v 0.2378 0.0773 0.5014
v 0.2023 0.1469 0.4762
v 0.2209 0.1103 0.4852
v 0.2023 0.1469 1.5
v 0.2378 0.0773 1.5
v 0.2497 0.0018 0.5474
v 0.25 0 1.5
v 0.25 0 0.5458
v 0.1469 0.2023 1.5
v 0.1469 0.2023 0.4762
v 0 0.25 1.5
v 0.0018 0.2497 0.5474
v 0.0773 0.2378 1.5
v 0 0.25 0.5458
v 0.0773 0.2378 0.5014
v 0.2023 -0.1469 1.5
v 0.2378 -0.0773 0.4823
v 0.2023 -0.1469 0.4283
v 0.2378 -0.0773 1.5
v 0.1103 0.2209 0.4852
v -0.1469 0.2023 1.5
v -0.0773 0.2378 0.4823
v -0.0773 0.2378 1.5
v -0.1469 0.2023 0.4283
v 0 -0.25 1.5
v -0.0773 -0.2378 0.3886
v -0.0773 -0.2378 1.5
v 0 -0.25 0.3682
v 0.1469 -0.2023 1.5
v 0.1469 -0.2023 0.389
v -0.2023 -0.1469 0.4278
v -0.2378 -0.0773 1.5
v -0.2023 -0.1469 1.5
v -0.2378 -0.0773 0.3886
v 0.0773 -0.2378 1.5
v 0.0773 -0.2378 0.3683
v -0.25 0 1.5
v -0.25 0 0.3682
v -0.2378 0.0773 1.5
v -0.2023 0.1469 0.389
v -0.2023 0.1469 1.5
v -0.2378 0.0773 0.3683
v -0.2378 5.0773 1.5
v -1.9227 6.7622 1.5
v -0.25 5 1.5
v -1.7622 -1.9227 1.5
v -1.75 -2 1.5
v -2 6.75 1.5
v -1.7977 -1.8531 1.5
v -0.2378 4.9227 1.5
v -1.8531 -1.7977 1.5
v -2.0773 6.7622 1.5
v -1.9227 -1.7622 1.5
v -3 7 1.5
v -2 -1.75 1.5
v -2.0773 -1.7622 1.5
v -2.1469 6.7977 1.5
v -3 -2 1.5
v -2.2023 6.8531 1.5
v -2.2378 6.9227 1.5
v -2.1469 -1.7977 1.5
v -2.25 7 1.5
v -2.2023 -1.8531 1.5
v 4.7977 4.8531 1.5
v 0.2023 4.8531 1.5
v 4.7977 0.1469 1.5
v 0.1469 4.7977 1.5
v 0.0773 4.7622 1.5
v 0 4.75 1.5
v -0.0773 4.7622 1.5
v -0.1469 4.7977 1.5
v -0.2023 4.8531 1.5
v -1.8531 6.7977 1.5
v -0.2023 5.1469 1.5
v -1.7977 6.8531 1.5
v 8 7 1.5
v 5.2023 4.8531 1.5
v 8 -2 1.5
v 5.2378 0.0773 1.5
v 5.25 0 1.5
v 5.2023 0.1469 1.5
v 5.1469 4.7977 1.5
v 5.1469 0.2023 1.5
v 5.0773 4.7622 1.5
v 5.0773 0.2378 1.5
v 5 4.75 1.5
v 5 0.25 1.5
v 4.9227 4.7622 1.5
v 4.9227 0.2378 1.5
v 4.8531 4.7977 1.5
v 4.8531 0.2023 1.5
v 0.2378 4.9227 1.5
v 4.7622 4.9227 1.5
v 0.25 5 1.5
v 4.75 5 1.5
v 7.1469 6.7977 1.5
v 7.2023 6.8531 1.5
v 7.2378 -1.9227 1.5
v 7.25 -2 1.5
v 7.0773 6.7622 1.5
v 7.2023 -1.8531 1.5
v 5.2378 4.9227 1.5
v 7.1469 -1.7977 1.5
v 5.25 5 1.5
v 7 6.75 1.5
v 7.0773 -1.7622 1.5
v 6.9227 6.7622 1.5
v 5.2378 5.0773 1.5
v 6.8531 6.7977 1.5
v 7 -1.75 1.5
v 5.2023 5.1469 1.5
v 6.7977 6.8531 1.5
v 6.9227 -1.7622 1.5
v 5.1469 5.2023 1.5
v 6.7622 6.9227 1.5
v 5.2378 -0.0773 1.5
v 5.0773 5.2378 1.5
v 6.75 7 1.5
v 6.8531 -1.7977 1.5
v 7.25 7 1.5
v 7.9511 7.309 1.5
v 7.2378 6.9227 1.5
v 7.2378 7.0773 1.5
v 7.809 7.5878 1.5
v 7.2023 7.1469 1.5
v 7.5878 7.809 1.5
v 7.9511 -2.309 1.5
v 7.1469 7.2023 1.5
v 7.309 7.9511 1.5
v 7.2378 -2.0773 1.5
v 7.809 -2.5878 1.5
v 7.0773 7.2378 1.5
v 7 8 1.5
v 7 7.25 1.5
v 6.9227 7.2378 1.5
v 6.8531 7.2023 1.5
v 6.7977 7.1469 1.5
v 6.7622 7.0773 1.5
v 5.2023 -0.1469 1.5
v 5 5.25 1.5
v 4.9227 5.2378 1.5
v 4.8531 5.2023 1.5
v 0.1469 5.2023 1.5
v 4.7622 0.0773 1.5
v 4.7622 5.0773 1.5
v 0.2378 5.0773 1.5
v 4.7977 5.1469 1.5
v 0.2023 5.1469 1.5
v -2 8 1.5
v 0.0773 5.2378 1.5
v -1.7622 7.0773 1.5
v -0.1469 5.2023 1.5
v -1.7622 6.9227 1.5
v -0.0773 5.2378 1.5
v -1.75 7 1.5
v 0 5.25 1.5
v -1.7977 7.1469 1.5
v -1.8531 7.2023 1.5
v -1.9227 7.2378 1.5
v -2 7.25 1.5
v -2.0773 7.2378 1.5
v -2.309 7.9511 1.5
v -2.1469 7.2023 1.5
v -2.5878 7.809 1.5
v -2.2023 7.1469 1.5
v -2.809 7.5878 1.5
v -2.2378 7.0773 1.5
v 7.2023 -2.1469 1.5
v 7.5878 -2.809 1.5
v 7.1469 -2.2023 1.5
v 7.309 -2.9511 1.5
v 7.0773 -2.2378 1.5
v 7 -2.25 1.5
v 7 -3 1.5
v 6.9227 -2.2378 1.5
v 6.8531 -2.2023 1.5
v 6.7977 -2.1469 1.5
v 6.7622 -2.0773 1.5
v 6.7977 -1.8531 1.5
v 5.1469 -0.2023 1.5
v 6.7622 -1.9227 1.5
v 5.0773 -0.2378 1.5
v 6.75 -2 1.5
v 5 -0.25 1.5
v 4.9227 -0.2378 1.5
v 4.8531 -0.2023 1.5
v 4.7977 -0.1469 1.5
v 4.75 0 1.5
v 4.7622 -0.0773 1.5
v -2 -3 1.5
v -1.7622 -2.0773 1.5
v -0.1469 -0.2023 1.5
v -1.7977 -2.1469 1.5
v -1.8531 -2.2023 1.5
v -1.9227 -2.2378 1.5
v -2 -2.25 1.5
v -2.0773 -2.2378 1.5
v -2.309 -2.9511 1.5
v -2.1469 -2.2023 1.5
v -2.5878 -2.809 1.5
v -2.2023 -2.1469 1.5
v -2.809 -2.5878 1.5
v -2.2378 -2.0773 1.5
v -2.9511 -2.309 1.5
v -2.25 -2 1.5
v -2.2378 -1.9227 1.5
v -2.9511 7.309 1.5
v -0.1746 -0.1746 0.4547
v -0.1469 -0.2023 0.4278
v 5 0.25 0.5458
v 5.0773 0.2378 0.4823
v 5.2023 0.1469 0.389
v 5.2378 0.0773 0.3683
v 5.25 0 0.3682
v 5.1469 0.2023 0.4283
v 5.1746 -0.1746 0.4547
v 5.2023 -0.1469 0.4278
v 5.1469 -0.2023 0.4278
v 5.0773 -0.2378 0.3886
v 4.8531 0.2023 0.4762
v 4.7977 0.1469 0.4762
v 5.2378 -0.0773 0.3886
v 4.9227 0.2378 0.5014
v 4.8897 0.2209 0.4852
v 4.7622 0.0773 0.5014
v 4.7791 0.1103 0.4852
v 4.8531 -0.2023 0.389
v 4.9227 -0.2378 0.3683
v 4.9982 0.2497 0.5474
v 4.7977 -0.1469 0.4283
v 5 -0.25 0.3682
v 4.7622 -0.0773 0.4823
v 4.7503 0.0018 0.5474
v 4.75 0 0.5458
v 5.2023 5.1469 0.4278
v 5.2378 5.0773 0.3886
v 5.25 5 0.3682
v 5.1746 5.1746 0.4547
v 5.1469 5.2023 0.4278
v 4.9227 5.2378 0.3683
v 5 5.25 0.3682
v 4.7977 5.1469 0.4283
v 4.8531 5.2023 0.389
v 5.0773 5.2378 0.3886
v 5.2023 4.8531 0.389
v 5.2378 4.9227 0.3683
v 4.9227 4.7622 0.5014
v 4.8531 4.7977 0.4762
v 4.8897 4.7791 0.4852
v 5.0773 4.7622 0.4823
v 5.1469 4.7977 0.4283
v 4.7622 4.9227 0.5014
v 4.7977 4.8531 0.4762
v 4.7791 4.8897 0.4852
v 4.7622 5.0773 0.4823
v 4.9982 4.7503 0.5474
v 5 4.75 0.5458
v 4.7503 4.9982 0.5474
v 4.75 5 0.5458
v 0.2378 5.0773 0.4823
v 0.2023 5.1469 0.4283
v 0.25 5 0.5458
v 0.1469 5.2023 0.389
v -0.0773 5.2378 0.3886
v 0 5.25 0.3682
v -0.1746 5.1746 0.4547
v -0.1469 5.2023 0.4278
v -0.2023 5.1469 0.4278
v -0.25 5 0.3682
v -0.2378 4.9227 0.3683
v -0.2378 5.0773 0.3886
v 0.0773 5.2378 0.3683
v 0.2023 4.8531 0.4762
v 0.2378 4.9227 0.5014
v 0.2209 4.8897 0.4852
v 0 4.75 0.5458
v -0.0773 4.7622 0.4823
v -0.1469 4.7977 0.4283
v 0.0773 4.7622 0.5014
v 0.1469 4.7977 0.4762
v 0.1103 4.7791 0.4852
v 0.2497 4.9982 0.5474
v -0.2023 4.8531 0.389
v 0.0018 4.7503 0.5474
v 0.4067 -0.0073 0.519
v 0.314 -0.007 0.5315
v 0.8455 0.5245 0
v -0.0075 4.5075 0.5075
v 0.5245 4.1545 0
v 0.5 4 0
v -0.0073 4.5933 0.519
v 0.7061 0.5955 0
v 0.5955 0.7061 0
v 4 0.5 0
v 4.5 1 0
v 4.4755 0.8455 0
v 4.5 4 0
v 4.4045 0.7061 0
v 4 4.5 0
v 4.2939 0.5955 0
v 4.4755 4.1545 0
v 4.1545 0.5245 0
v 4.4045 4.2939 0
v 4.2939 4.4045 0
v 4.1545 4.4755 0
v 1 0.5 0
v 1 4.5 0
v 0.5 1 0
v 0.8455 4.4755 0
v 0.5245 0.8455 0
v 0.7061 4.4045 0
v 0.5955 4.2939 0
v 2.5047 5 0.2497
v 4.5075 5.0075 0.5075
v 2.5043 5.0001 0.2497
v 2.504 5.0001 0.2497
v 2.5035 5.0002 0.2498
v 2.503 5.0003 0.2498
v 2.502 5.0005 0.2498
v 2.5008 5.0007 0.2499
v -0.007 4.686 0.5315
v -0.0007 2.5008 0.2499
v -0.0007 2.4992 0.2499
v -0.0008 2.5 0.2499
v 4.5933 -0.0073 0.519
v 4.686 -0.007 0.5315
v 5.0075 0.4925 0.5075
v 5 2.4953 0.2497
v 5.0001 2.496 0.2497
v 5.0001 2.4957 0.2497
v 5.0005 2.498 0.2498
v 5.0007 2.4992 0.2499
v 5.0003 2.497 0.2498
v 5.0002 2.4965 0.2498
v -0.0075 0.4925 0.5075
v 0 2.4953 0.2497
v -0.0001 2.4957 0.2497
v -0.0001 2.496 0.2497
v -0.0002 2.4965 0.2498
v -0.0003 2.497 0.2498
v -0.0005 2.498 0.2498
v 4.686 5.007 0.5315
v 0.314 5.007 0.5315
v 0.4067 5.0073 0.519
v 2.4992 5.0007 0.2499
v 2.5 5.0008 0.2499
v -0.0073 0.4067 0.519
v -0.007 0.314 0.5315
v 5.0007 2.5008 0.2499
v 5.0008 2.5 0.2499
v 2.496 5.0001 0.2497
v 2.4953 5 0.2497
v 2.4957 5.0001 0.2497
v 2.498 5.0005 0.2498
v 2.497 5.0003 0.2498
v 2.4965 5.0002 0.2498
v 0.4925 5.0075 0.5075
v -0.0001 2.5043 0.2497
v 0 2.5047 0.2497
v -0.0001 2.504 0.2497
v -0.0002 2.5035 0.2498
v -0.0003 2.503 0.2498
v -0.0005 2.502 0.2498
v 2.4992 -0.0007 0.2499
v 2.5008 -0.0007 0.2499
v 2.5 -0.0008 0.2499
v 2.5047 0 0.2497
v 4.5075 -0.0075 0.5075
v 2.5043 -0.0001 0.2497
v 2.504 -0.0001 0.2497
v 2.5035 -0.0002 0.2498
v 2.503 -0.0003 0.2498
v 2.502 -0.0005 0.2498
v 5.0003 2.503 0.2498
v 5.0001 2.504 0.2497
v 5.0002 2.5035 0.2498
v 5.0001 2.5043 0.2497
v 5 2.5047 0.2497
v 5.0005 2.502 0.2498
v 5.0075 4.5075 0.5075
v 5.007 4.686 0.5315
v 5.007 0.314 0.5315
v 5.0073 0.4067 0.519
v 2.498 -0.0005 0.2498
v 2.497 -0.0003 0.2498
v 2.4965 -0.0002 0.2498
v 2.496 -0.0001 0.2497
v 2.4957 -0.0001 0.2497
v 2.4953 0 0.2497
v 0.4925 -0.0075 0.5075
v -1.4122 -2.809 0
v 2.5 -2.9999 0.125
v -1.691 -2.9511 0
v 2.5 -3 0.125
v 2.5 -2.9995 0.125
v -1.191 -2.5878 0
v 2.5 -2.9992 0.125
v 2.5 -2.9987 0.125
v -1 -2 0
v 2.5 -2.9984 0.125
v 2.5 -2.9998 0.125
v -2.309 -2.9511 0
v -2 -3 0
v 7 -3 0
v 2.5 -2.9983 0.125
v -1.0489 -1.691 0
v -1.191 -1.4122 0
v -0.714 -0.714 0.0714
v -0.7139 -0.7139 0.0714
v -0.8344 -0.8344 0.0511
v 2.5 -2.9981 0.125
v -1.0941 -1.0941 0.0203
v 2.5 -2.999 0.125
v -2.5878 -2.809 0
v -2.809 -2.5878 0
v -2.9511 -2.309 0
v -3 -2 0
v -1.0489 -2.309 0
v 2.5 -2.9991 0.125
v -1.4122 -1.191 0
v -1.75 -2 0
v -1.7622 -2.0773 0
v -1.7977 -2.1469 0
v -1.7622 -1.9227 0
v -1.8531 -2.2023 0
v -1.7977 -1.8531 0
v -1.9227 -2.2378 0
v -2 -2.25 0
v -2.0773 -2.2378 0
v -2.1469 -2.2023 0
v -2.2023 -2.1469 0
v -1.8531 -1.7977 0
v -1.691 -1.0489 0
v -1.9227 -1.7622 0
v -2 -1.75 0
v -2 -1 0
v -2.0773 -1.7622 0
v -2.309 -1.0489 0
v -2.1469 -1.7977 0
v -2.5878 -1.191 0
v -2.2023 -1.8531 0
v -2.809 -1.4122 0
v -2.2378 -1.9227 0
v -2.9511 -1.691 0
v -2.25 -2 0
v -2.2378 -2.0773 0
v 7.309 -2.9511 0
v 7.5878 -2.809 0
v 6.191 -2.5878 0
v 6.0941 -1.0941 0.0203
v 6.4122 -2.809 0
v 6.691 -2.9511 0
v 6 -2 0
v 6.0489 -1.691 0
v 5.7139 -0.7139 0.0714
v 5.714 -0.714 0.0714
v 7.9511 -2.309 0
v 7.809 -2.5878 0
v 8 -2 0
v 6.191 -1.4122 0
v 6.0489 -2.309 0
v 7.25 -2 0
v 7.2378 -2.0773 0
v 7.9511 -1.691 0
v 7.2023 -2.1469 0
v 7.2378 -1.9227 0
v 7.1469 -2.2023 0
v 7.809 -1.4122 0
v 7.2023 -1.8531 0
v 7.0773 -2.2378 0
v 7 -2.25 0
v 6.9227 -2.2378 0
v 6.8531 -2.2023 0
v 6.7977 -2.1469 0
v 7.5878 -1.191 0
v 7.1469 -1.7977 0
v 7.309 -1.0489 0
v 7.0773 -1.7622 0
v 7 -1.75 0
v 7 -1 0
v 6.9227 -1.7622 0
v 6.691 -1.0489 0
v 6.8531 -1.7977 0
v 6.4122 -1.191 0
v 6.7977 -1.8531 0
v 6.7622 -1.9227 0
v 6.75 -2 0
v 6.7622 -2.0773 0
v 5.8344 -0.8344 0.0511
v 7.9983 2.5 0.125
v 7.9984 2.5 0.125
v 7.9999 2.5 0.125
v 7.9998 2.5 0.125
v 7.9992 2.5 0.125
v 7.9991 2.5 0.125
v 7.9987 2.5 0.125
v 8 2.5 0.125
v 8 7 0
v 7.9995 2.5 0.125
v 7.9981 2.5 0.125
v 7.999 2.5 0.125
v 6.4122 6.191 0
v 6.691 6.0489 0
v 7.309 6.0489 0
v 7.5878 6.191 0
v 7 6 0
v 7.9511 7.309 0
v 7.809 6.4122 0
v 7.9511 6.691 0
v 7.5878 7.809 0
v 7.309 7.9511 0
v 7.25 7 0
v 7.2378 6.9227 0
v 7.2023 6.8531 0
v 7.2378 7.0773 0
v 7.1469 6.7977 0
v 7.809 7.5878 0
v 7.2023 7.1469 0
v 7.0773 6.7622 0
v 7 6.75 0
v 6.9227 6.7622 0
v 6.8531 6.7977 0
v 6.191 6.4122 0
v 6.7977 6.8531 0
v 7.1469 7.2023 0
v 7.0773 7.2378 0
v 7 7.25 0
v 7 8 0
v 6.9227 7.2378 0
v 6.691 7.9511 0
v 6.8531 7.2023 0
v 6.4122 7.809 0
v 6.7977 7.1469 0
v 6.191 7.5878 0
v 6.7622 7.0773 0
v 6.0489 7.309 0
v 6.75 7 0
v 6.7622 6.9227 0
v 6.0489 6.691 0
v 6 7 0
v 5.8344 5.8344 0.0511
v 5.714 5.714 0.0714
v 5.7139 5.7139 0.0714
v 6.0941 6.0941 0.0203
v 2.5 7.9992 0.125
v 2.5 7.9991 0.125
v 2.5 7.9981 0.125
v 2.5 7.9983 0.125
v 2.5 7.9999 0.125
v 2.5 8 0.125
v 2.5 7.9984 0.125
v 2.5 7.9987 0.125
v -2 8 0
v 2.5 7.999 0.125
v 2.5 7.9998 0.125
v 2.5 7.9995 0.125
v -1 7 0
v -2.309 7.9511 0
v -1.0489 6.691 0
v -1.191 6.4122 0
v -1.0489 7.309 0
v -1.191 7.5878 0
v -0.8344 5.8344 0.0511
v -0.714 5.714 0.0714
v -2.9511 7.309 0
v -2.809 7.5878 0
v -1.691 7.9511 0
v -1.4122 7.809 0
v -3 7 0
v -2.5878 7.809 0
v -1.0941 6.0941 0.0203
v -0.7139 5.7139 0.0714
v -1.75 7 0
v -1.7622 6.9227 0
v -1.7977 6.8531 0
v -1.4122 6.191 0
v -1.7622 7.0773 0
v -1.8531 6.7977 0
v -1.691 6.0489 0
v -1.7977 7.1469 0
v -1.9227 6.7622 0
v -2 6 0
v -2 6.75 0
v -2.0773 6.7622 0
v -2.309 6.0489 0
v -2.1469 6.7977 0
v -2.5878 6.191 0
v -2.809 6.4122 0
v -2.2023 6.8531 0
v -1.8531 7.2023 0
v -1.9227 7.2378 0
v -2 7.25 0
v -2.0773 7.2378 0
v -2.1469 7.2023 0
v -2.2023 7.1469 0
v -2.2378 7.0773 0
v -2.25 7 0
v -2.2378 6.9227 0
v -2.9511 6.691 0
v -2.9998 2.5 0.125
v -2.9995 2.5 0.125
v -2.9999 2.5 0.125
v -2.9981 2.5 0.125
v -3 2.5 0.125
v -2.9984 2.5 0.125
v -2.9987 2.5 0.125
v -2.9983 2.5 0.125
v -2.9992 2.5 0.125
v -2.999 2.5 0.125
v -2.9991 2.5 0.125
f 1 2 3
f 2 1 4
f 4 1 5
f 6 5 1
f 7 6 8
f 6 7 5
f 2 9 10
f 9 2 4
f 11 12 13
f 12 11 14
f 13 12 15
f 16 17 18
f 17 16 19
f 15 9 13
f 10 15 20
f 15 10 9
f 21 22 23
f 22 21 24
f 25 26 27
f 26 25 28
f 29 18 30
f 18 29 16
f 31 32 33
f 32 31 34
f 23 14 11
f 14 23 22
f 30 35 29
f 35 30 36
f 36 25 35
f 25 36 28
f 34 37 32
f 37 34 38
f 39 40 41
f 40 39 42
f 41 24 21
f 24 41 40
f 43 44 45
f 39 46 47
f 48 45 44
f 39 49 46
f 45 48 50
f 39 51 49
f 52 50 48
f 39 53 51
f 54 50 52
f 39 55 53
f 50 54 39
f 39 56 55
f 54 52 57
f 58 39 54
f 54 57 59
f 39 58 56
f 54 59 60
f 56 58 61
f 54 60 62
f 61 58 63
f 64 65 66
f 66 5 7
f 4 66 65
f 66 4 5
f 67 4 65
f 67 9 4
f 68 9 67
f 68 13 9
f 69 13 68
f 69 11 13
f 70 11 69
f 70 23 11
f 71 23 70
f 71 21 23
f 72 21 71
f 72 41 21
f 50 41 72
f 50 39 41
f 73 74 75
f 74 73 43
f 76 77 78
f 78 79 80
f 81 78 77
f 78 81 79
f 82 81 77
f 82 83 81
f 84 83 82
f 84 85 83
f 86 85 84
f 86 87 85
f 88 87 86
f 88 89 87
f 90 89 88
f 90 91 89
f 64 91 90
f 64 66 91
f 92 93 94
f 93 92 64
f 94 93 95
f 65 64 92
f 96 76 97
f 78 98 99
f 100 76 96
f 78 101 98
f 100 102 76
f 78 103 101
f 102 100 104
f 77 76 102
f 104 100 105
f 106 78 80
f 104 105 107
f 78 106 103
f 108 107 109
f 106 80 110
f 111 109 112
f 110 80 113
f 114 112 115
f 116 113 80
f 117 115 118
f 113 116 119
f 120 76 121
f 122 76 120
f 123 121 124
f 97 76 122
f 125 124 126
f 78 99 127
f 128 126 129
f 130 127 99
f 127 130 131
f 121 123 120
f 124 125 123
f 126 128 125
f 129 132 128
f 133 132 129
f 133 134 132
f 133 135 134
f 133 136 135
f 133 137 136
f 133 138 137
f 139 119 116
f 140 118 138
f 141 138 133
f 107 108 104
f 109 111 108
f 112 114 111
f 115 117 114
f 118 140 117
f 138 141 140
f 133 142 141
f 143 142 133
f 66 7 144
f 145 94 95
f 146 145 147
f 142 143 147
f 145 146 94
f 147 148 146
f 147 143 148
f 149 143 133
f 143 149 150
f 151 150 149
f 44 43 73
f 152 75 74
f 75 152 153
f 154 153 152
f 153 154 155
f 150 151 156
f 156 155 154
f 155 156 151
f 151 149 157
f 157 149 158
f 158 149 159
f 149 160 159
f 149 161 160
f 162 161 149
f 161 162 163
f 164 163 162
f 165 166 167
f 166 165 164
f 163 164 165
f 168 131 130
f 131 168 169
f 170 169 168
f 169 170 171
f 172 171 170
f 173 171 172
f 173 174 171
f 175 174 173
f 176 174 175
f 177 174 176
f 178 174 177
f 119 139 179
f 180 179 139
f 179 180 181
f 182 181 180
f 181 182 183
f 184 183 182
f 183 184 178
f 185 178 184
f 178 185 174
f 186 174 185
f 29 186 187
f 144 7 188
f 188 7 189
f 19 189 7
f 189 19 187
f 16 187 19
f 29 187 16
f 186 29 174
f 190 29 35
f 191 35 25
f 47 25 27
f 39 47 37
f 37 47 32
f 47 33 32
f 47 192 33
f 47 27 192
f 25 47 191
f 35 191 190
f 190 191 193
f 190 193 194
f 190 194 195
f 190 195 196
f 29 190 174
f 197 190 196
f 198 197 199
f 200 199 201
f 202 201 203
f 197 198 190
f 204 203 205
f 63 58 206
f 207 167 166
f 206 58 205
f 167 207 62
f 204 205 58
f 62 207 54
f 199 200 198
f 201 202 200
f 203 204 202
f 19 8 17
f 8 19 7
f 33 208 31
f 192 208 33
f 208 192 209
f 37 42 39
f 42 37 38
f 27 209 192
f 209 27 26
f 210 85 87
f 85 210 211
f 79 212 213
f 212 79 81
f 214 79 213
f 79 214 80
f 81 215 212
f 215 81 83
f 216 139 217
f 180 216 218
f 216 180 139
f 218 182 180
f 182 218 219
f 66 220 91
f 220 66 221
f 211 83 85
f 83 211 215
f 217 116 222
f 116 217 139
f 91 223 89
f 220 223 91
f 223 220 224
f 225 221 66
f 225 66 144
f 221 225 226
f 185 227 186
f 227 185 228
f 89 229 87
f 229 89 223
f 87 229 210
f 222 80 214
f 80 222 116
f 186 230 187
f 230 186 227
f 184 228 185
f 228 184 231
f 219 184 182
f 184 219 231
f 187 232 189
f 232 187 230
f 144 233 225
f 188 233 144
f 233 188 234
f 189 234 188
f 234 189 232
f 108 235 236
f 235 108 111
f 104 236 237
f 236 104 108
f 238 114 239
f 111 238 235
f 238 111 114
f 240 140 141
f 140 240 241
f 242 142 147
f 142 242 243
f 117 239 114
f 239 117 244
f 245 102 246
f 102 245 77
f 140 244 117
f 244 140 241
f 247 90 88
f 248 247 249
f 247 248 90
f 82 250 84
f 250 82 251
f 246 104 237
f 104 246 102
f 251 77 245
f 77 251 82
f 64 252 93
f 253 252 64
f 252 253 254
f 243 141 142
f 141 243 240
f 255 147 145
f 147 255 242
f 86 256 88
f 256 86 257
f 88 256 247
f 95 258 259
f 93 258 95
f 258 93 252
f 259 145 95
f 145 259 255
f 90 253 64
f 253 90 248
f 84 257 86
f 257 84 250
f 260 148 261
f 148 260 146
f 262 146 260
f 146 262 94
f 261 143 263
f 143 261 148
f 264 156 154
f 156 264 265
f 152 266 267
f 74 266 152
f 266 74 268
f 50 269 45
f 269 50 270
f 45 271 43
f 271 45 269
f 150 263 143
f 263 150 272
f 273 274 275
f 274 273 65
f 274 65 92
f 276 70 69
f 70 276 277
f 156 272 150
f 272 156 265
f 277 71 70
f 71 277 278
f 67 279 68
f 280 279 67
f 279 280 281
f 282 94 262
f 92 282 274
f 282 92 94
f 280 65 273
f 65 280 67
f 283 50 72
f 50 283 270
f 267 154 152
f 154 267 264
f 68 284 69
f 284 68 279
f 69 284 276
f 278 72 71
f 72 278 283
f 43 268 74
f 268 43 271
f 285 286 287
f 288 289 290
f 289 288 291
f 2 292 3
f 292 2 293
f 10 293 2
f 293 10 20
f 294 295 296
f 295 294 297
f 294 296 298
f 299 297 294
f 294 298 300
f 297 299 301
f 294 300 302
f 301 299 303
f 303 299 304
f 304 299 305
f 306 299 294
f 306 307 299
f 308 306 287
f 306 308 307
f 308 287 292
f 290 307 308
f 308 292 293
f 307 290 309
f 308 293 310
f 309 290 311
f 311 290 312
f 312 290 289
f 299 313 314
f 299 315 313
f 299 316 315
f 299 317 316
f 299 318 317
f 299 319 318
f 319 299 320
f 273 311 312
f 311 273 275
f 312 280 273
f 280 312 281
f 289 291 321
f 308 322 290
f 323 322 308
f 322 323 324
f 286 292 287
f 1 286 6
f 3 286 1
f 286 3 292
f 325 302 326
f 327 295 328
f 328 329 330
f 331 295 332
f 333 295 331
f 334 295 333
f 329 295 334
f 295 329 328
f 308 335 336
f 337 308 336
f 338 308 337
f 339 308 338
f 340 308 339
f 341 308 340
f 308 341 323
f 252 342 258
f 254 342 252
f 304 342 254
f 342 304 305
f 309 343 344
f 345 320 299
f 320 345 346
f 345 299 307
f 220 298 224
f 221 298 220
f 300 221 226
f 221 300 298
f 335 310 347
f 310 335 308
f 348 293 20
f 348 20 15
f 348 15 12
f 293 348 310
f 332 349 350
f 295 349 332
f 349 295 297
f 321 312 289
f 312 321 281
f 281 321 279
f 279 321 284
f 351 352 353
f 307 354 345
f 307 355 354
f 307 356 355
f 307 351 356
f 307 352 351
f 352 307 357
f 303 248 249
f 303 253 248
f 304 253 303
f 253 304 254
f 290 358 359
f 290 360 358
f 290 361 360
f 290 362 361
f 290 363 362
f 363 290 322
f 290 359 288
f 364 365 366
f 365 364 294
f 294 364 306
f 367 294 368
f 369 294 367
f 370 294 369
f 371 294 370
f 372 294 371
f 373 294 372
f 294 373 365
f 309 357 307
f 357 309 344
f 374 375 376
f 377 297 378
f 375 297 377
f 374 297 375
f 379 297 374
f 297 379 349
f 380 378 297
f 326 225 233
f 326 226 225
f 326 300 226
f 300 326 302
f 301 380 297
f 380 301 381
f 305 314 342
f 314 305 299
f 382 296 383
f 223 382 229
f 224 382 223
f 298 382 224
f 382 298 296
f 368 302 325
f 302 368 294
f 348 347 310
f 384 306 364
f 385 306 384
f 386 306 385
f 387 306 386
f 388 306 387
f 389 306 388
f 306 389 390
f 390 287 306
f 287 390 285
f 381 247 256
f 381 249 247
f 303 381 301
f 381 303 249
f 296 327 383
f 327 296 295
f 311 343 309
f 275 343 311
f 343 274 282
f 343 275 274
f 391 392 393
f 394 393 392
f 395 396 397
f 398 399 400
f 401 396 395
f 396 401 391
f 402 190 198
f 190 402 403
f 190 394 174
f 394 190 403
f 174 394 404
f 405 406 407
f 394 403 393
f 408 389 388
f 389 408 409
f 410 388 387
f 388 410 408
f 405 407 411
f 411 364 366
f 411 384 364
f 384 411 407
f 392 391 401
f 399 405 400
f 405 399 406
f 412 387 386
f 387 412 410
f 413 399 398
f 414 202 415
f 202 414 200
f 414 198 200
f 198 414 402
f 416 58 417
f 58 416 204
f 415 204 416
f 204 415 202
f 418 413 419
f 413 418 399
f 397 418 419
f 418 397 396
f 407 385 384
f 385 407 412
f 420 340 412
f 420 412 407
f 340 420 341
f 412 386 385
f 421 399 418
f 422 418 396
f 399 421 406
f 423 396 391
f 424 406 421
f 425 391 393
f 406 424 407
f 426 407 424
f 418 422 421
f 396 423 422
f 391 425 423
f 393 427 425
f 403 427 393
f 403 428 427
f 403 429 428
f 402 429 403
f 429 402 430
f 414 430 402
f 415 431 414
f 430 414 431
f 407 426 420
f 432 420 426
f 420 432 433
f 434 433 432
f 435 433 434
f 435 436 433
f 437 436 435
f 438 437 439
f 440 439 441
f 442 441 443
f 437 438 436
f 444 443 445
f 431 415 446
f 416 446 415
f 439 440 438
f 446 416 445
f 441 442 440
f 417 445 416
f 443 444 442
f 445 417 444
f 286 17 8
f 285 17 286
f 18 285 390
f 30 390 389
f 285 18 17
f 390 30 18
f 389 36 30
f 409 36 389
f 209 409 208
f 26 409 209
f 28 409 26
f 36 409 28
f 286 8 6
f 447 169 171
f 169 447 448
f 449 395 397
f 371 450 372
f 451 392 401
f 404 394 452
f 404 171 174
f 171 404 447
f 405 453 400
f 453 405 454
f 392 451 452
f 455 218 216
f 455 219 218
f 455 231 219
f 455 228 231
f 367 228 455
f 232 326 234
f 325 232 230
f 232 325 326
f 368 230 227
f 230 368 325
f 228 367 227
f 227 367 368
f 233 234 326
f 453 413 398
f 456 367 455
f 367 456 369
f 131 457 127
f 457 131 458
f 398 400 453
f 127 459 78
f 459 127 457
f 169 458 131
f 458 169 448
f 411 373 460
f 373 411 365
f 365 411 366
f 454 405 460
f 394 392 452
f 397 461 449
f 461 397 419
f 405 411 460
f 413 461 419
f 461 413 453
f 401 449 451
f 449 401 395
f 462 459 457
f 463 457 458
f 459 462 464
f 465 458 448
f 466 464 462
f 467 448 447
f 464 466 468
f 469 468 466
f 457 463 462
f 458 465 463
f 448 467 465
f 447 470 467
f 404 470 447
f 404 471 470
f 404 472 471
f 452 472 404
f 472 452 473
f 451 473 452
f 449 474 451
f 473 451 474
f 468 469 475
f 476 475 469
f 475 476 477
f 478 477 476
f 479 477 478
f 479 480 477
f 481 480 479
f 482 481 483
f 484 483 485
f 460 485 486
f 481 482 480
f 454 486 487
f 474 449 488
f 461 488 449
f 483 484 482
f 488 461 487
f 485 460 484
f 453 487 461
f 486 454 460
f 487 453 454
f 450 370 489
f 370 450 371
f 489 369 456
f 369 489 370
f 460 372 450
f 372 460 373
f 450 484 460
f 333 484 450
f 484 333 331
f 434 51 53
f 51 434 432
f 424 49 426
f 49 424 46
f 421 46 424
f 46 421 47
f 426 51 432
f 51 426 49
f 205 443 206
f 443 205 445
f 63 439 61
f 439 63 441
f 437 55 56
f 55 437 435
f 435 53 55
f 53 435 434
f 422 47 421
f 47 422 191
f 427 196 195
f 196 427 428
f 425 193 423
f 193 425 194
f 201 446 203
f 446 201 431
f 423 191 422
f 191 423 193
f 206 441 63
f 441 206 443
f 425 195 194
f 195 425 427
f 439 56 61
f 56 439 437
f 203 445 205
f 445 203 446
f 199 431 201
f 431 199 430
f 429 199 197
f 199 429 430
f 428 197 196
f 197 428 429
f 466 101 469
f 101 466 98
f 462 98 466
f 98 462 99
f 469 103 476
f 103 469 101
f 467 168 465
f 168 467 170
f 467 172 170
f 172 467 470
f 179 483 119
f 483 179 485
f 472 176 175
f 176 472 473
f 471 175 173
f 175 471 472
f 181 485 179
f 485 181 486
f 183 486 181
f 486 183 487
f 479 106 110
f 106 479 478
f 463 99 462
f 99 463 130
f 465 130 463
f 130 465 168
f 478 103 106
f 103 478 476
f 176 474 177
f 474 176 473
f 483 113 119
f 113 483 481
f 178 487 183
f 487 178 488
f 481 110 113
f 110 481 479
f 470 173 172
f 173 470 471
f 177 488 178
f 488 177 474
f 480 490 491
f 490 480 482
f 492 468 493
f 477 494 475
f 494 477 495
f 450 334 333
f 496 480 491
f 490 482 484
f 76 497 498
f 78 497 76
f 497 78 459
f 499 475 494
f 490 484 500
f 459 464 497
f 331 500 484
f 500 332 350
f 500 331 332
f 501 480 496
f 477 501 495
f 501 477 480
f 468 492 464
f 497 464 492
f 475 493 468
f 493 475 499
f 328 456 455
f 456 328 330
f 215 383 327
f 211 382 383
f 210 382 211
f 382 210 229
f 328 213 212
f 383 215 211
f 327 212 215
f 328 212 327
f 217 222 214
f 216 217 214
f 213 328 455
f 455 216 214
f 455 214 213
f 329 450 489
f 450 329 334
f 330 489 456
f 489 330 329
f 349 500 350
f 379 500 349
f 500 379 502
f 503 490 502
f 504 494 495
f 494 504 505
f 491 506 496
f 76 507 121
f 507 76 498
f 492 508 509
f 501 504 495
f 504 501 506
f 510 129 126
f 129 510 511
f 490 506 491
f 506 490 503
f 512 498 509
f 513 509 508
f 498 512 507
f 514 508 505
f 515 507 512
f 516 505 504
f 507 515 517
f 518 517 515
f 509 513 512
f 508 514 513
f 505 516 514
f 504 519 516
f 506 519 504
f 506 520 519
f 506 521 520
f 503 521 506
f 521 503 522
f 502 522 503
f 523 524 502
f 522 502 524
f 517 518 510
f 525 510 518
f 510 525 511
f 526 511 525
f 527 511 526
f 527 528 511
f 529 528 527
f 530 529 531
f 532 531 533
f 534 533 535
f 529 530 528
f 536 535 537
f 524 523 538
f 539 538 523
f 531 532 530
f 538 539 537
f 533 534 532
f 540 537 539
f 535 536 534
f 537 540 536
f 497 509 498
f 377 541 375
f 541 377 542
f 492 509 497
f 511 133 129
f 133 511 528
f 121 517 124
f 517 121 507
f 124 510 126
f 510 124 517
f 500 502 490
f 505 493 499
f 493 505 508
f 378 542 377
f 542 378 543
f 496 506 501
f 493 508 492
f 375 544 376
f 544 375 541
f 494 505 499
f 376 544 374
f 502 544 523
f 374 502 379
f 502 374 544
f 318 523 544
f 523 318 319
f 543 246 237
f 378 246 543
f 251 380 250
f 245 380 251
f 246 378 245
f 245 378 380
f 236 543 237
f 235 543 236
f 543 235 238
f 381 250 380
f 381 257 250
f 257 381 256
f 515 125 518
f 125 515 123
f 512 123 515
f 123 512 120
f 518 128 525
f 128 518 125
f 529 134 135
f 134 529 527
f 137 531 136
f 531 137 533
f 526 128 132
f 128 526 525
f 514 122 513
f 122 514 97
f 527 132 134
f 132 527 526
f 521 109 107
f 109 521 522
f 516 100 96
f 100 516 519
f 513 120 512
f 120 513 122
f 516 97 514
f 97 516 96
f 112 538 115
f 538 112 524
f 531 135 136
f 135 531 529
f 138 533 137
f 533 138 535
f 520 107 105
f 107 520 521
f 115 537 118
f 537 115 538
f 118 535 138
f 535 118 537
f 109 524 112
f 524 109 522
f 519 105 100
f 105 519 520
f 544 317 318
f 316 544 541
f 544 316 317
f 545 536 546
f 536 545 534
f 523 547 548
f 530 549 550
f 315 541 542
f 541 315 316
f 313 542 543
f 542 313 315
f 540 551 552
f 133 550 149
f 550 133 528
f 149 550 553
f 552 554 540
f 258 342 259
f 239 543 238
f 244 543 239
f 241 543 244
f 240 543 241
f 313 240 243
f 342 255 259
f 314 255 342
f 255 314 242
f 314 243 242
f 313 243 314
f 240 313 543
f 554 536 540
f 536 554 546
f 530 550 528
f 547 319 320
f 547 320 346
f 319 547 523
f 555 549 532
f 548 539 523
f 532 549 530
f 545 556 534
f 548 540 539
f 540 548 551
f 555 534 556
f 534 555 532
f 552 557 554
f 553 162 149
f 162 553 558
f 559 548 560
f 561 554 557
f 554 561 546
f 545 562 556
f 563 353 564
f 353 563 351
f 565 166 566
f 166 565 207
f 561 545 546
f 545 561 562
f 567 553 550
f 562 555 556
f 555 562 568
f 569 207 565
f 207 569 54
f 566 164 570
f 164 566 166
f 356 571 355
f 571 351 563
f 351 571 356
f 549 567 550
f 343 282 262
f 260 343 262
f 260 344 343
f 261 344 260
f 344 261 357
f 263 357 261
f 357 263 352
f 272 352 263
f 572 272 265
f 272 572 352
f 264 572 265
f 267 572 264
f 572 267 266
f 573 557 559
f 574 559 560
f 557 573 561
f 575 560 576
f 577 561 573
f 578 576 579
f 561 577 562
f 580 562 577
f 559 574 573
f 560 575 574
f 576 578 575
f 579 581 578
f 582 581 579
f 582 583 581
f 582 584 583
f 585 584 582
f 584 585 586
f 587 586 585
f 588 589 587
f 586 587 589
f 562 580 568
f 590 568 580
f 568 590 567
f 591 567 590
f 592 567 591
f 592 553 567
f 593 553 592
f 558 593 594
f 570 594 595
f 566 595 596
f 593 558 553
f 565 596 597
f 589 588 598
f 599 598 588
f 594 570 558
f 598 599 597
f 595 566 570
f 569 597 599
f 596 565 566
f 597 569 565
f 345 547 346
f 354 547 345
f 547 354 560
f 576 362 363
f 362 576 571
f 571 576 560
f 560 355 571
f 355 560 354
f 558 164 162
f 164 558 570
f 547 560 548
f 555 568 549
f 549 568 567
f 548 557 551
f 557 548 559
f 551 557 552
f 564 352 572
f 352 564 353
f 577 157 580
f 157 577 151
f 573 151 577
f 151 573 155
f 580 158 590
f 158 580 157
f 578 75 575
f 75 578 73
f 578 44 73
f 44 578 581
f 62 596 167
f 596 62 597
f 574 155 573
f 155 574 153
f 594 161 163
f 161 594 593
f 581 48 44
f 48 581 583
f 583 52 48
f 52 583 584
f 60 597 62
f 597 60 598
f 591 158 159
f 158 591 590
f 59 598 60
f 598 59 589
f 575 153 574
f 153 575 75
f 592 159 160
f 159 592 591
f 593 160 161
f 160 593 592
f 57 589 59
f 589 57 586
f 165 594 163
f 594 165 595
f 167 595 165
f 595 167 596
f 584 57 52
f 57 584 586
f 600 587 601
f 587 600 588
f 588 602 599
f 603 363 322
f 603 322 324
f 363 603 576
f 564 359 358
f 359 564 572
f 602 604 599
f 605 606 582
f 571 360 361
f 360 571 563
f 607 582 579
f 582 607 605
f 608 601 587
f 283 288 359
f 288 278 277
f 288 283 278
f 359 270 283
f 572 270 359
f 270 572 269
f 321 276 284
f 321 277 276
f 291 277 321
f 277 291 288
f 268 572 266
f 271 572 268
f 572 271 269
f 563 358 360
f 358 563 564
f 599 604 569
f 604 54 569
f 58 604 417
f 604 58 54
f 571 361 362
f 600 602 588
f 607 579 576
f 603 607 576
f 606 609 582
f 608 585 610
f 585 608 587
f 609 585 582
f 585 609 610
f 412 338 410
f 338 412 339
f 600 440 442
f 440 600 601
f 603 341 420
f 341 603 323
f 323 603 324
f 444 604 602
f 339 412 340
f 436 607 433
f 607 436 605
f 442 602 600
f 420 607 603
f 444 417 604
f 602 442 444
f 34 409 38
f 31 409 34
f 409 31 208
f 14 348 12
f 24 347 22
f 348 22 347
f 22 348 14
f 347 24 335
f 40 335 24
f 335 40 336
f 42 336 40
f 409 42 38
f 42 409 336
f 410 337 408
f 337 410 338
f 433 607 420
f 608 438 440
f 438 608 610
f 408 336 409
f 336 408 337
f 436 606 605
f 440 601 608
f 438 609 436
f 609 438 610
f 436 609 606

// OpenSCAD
// file: common.scad
function assertion_failed()=(assertion_failed());

module domeassert(x,msg)
{ 
if (!x) {
    echo("this shit failed:", msg);
    echo("",assertion_failed());
}
}

module rounded_square(
    center, // x,y,z coordinates of center
    dims, // width (x dimension), length (y dimension), height (z dimension)
    corner_radius, // the radius of the corners
) {
    // the corners
    corners_x=[-(dims[0]*0.5-corner_radius),(dims[0]*0.5-corner_radius)];
    corners_y=[-(dims[1]*0.5-corner_radius),(dims[1]*0.5-corner_radius)];
    translate(center) {
        // Draw the corners
        for (x=corners_x) {
            for(y=corners_y) {
                translate ([x,y,0]) {
                    cylinder(r=corner_radius,h=dims[2],center=true);
                }
            }
        }
        // draw the inner cube
        cube([dims[0]-2*corner_radius,dims[1]-2*corner_radius,dims[2]],center=true);
        // fill in the edges
        for (x=corners_x) {
            translate([x,0,0]) {
                cube([2*corner_radius,dims[1]-2*corner_radius,dims[2]],center=true);
            }
        }
        for (y=corners_y) {
            translate([0,y,0]) {
                cube([dims[0]-2*corner_radius,2*corner_radius,dims[2]],center=true);
            }
        }
        
    }
}

module rounded_shaft(
    center, // x,y,z coordinates of center
    dims, // width (x dimension), length (y dimension), height (z dimension) (INSIDE of shaft)
    corner_radius, // the radius of the corners of the INSIDE of the shaft
    wall_thickness, // the thickness of the walls
) {
difference(){
rounded_square(center,[dims.x+2*wall_thickness,dims.y+2*wall_thickness,dims.z],wall_thickness+corner_radius);
rounded_square(center,[dims.x,dims.y,dims.z+1e-3],corner_radius);
}
}

function zeroz(p)=[p[0],p[1],0];
function wrap(i,mi,ma)=(i<mi?wrap(i+(ma-mi),mi,ma):i>=ma?wrap(i-(ma-mi),mi,ma):i);
function index_slice(a,start,end)=[for(i=[start:(end-1)])a[wrap(i,0,len(a))]];
// main file
use <common.scad>

$fn=20;

air_hole_coords=[
[0,0,1],
[5,0,1],
[5,5,1],
[0,5,1]
];
air_hole_height=0.5;
air_hole_void_height=1.5;
air_hole_outer_radius=0.5;
air_hole_void_radius=0.25;


screw_hole_coords=[
[1,1,0],
[4,1,0],
[4,4,0],
[1,4,0]
];
screw_hole_height=1;
screw_hole_outer_radius=0.5;

shaft_attach_hole_coords=[
[-2,-2,0],
[7,-2,0],
[7,7,0],
[-2,7,0]
];
shaft_attach_hole_height=air_hole_void_height;
shaft_attach_hole_outer_radius=1;
shaft_attach_hole_inner_radius=0.25;

med_cyl_z=0.25;
med_cyl_coords=[
[2.5,0,med_cyl_z],
[5,2.5,med_cyl_z],
[2.5,5,med_cyl_z],
[0,2.5,med_cyl_z]
];
med_cyl_height=shaft_attach_hole_height-med_cyl_z;
med_cyl_radius=0.001;

outer_med_cyl_radius=0.001;
outer_med_cyl_offset=shaft_attach_hole_outer_radius-outer_med_cyl_radius;
outer_med_cyl_coords=[
[2.5,-2-outer_med_cyl_offset,0.125],
[7+outer_med_cyl_offset,2.5,0.125],
[2.5,7+outer_med_cyl_offset,0.125],
[-2-outer_med_cyl_offset,2.5,0.125]
];
outer_med_cyl_height=shaft_attach_hole_height-0.125;

module inner_curved_bottom () {
difference () {
hull () {
for (p=air_hole_coords) { translate(p) cylinder(r=air_hole_outer_radius,h=air_hole_height); }
for (p=med_cyl_coords) { translate(p) cylinder(r=med_cyl_radius,h=med_cyl_height); }
for (p=screw_hole_coords) { translate(p) cylinder(r=screw_hole_outer_radius,h=screw_hole_height); }
}
union () {
for (p=air_hole_coords) {
translate(zeroz(p)) cylinder(r=air_hole_void_radius,h=air_hole_void_height); 

}
}
}
}

module outer_curved_bottom () {
    for(i=[0:3]){
        difference () {
            union () {
            hull () {
                translate(shaft_attach_hole_coords[i]) 
                        cylinder(r=shaft_attach_hole_outer_radius,h=shaft_attach_hole_height);
                translate(med_cyl_coords[i])
                    cylinder(r=med_cyl_radius,h=med_cyl_height);
                translate(outer_med_cyl_coords[i])
                    cylinder(r=outer_med_cyl_radius,h=outer_med_cyl_height);
                translate(air_hole_coords[i]) cylinder(r=air_hole_outer_radius,h=air_hole_height);
            }
            hull () {
                translate(shaft_attach_hole_coords[wrap(i+1,0,len(shaft_attach_hole_coords))]) 
                        cylinder(r=shaft_attach_hole_outer_radius,h=shaft_attach_hole_height);
                translate(med_cyl_coords[i])
                    cylinder(r=med_cyl_radius,h=med_cyl_height);
                translate(outer_med_cyl_coords[i])
                    cylinder(r=outer_med_cyl_radius,h=outer_med_cyl_height);
                translate(air_hole_coords[wrap(i+1,0,len(air_hole_coords))])
                    cylinder(r=air_hole_outer_radius,h=air_hole_height);
            }
            }
            union () {
                translate(shaft_attach_hole_coords[i])
                    cylinder(r=shaft_attach_hole_inner_radius,h=shaft_attach_hole_height);
                translate(zeroz(air_hole_coords[i]))
                    cylinder(r=air_hole_void_radius,h=air_hole_void_height);
                translate(shaft_attach_hole_coords[wrap(i+1,0,len(shaft_attach_hole_coords))]) 
                    cylinder(r=shaft_attach_hole_inner_radius,h=shaft_attach_hole_height);
                translate(zeroz(air_hole_coords[wrap(i+1,0,len(air_hole_coords))]))
                    cylinder(r=air_hole_void_radius,h=air_hole_void_height);
            }
        }
    }
}

inner_curved_bottom();
outer_curved_bottom();
